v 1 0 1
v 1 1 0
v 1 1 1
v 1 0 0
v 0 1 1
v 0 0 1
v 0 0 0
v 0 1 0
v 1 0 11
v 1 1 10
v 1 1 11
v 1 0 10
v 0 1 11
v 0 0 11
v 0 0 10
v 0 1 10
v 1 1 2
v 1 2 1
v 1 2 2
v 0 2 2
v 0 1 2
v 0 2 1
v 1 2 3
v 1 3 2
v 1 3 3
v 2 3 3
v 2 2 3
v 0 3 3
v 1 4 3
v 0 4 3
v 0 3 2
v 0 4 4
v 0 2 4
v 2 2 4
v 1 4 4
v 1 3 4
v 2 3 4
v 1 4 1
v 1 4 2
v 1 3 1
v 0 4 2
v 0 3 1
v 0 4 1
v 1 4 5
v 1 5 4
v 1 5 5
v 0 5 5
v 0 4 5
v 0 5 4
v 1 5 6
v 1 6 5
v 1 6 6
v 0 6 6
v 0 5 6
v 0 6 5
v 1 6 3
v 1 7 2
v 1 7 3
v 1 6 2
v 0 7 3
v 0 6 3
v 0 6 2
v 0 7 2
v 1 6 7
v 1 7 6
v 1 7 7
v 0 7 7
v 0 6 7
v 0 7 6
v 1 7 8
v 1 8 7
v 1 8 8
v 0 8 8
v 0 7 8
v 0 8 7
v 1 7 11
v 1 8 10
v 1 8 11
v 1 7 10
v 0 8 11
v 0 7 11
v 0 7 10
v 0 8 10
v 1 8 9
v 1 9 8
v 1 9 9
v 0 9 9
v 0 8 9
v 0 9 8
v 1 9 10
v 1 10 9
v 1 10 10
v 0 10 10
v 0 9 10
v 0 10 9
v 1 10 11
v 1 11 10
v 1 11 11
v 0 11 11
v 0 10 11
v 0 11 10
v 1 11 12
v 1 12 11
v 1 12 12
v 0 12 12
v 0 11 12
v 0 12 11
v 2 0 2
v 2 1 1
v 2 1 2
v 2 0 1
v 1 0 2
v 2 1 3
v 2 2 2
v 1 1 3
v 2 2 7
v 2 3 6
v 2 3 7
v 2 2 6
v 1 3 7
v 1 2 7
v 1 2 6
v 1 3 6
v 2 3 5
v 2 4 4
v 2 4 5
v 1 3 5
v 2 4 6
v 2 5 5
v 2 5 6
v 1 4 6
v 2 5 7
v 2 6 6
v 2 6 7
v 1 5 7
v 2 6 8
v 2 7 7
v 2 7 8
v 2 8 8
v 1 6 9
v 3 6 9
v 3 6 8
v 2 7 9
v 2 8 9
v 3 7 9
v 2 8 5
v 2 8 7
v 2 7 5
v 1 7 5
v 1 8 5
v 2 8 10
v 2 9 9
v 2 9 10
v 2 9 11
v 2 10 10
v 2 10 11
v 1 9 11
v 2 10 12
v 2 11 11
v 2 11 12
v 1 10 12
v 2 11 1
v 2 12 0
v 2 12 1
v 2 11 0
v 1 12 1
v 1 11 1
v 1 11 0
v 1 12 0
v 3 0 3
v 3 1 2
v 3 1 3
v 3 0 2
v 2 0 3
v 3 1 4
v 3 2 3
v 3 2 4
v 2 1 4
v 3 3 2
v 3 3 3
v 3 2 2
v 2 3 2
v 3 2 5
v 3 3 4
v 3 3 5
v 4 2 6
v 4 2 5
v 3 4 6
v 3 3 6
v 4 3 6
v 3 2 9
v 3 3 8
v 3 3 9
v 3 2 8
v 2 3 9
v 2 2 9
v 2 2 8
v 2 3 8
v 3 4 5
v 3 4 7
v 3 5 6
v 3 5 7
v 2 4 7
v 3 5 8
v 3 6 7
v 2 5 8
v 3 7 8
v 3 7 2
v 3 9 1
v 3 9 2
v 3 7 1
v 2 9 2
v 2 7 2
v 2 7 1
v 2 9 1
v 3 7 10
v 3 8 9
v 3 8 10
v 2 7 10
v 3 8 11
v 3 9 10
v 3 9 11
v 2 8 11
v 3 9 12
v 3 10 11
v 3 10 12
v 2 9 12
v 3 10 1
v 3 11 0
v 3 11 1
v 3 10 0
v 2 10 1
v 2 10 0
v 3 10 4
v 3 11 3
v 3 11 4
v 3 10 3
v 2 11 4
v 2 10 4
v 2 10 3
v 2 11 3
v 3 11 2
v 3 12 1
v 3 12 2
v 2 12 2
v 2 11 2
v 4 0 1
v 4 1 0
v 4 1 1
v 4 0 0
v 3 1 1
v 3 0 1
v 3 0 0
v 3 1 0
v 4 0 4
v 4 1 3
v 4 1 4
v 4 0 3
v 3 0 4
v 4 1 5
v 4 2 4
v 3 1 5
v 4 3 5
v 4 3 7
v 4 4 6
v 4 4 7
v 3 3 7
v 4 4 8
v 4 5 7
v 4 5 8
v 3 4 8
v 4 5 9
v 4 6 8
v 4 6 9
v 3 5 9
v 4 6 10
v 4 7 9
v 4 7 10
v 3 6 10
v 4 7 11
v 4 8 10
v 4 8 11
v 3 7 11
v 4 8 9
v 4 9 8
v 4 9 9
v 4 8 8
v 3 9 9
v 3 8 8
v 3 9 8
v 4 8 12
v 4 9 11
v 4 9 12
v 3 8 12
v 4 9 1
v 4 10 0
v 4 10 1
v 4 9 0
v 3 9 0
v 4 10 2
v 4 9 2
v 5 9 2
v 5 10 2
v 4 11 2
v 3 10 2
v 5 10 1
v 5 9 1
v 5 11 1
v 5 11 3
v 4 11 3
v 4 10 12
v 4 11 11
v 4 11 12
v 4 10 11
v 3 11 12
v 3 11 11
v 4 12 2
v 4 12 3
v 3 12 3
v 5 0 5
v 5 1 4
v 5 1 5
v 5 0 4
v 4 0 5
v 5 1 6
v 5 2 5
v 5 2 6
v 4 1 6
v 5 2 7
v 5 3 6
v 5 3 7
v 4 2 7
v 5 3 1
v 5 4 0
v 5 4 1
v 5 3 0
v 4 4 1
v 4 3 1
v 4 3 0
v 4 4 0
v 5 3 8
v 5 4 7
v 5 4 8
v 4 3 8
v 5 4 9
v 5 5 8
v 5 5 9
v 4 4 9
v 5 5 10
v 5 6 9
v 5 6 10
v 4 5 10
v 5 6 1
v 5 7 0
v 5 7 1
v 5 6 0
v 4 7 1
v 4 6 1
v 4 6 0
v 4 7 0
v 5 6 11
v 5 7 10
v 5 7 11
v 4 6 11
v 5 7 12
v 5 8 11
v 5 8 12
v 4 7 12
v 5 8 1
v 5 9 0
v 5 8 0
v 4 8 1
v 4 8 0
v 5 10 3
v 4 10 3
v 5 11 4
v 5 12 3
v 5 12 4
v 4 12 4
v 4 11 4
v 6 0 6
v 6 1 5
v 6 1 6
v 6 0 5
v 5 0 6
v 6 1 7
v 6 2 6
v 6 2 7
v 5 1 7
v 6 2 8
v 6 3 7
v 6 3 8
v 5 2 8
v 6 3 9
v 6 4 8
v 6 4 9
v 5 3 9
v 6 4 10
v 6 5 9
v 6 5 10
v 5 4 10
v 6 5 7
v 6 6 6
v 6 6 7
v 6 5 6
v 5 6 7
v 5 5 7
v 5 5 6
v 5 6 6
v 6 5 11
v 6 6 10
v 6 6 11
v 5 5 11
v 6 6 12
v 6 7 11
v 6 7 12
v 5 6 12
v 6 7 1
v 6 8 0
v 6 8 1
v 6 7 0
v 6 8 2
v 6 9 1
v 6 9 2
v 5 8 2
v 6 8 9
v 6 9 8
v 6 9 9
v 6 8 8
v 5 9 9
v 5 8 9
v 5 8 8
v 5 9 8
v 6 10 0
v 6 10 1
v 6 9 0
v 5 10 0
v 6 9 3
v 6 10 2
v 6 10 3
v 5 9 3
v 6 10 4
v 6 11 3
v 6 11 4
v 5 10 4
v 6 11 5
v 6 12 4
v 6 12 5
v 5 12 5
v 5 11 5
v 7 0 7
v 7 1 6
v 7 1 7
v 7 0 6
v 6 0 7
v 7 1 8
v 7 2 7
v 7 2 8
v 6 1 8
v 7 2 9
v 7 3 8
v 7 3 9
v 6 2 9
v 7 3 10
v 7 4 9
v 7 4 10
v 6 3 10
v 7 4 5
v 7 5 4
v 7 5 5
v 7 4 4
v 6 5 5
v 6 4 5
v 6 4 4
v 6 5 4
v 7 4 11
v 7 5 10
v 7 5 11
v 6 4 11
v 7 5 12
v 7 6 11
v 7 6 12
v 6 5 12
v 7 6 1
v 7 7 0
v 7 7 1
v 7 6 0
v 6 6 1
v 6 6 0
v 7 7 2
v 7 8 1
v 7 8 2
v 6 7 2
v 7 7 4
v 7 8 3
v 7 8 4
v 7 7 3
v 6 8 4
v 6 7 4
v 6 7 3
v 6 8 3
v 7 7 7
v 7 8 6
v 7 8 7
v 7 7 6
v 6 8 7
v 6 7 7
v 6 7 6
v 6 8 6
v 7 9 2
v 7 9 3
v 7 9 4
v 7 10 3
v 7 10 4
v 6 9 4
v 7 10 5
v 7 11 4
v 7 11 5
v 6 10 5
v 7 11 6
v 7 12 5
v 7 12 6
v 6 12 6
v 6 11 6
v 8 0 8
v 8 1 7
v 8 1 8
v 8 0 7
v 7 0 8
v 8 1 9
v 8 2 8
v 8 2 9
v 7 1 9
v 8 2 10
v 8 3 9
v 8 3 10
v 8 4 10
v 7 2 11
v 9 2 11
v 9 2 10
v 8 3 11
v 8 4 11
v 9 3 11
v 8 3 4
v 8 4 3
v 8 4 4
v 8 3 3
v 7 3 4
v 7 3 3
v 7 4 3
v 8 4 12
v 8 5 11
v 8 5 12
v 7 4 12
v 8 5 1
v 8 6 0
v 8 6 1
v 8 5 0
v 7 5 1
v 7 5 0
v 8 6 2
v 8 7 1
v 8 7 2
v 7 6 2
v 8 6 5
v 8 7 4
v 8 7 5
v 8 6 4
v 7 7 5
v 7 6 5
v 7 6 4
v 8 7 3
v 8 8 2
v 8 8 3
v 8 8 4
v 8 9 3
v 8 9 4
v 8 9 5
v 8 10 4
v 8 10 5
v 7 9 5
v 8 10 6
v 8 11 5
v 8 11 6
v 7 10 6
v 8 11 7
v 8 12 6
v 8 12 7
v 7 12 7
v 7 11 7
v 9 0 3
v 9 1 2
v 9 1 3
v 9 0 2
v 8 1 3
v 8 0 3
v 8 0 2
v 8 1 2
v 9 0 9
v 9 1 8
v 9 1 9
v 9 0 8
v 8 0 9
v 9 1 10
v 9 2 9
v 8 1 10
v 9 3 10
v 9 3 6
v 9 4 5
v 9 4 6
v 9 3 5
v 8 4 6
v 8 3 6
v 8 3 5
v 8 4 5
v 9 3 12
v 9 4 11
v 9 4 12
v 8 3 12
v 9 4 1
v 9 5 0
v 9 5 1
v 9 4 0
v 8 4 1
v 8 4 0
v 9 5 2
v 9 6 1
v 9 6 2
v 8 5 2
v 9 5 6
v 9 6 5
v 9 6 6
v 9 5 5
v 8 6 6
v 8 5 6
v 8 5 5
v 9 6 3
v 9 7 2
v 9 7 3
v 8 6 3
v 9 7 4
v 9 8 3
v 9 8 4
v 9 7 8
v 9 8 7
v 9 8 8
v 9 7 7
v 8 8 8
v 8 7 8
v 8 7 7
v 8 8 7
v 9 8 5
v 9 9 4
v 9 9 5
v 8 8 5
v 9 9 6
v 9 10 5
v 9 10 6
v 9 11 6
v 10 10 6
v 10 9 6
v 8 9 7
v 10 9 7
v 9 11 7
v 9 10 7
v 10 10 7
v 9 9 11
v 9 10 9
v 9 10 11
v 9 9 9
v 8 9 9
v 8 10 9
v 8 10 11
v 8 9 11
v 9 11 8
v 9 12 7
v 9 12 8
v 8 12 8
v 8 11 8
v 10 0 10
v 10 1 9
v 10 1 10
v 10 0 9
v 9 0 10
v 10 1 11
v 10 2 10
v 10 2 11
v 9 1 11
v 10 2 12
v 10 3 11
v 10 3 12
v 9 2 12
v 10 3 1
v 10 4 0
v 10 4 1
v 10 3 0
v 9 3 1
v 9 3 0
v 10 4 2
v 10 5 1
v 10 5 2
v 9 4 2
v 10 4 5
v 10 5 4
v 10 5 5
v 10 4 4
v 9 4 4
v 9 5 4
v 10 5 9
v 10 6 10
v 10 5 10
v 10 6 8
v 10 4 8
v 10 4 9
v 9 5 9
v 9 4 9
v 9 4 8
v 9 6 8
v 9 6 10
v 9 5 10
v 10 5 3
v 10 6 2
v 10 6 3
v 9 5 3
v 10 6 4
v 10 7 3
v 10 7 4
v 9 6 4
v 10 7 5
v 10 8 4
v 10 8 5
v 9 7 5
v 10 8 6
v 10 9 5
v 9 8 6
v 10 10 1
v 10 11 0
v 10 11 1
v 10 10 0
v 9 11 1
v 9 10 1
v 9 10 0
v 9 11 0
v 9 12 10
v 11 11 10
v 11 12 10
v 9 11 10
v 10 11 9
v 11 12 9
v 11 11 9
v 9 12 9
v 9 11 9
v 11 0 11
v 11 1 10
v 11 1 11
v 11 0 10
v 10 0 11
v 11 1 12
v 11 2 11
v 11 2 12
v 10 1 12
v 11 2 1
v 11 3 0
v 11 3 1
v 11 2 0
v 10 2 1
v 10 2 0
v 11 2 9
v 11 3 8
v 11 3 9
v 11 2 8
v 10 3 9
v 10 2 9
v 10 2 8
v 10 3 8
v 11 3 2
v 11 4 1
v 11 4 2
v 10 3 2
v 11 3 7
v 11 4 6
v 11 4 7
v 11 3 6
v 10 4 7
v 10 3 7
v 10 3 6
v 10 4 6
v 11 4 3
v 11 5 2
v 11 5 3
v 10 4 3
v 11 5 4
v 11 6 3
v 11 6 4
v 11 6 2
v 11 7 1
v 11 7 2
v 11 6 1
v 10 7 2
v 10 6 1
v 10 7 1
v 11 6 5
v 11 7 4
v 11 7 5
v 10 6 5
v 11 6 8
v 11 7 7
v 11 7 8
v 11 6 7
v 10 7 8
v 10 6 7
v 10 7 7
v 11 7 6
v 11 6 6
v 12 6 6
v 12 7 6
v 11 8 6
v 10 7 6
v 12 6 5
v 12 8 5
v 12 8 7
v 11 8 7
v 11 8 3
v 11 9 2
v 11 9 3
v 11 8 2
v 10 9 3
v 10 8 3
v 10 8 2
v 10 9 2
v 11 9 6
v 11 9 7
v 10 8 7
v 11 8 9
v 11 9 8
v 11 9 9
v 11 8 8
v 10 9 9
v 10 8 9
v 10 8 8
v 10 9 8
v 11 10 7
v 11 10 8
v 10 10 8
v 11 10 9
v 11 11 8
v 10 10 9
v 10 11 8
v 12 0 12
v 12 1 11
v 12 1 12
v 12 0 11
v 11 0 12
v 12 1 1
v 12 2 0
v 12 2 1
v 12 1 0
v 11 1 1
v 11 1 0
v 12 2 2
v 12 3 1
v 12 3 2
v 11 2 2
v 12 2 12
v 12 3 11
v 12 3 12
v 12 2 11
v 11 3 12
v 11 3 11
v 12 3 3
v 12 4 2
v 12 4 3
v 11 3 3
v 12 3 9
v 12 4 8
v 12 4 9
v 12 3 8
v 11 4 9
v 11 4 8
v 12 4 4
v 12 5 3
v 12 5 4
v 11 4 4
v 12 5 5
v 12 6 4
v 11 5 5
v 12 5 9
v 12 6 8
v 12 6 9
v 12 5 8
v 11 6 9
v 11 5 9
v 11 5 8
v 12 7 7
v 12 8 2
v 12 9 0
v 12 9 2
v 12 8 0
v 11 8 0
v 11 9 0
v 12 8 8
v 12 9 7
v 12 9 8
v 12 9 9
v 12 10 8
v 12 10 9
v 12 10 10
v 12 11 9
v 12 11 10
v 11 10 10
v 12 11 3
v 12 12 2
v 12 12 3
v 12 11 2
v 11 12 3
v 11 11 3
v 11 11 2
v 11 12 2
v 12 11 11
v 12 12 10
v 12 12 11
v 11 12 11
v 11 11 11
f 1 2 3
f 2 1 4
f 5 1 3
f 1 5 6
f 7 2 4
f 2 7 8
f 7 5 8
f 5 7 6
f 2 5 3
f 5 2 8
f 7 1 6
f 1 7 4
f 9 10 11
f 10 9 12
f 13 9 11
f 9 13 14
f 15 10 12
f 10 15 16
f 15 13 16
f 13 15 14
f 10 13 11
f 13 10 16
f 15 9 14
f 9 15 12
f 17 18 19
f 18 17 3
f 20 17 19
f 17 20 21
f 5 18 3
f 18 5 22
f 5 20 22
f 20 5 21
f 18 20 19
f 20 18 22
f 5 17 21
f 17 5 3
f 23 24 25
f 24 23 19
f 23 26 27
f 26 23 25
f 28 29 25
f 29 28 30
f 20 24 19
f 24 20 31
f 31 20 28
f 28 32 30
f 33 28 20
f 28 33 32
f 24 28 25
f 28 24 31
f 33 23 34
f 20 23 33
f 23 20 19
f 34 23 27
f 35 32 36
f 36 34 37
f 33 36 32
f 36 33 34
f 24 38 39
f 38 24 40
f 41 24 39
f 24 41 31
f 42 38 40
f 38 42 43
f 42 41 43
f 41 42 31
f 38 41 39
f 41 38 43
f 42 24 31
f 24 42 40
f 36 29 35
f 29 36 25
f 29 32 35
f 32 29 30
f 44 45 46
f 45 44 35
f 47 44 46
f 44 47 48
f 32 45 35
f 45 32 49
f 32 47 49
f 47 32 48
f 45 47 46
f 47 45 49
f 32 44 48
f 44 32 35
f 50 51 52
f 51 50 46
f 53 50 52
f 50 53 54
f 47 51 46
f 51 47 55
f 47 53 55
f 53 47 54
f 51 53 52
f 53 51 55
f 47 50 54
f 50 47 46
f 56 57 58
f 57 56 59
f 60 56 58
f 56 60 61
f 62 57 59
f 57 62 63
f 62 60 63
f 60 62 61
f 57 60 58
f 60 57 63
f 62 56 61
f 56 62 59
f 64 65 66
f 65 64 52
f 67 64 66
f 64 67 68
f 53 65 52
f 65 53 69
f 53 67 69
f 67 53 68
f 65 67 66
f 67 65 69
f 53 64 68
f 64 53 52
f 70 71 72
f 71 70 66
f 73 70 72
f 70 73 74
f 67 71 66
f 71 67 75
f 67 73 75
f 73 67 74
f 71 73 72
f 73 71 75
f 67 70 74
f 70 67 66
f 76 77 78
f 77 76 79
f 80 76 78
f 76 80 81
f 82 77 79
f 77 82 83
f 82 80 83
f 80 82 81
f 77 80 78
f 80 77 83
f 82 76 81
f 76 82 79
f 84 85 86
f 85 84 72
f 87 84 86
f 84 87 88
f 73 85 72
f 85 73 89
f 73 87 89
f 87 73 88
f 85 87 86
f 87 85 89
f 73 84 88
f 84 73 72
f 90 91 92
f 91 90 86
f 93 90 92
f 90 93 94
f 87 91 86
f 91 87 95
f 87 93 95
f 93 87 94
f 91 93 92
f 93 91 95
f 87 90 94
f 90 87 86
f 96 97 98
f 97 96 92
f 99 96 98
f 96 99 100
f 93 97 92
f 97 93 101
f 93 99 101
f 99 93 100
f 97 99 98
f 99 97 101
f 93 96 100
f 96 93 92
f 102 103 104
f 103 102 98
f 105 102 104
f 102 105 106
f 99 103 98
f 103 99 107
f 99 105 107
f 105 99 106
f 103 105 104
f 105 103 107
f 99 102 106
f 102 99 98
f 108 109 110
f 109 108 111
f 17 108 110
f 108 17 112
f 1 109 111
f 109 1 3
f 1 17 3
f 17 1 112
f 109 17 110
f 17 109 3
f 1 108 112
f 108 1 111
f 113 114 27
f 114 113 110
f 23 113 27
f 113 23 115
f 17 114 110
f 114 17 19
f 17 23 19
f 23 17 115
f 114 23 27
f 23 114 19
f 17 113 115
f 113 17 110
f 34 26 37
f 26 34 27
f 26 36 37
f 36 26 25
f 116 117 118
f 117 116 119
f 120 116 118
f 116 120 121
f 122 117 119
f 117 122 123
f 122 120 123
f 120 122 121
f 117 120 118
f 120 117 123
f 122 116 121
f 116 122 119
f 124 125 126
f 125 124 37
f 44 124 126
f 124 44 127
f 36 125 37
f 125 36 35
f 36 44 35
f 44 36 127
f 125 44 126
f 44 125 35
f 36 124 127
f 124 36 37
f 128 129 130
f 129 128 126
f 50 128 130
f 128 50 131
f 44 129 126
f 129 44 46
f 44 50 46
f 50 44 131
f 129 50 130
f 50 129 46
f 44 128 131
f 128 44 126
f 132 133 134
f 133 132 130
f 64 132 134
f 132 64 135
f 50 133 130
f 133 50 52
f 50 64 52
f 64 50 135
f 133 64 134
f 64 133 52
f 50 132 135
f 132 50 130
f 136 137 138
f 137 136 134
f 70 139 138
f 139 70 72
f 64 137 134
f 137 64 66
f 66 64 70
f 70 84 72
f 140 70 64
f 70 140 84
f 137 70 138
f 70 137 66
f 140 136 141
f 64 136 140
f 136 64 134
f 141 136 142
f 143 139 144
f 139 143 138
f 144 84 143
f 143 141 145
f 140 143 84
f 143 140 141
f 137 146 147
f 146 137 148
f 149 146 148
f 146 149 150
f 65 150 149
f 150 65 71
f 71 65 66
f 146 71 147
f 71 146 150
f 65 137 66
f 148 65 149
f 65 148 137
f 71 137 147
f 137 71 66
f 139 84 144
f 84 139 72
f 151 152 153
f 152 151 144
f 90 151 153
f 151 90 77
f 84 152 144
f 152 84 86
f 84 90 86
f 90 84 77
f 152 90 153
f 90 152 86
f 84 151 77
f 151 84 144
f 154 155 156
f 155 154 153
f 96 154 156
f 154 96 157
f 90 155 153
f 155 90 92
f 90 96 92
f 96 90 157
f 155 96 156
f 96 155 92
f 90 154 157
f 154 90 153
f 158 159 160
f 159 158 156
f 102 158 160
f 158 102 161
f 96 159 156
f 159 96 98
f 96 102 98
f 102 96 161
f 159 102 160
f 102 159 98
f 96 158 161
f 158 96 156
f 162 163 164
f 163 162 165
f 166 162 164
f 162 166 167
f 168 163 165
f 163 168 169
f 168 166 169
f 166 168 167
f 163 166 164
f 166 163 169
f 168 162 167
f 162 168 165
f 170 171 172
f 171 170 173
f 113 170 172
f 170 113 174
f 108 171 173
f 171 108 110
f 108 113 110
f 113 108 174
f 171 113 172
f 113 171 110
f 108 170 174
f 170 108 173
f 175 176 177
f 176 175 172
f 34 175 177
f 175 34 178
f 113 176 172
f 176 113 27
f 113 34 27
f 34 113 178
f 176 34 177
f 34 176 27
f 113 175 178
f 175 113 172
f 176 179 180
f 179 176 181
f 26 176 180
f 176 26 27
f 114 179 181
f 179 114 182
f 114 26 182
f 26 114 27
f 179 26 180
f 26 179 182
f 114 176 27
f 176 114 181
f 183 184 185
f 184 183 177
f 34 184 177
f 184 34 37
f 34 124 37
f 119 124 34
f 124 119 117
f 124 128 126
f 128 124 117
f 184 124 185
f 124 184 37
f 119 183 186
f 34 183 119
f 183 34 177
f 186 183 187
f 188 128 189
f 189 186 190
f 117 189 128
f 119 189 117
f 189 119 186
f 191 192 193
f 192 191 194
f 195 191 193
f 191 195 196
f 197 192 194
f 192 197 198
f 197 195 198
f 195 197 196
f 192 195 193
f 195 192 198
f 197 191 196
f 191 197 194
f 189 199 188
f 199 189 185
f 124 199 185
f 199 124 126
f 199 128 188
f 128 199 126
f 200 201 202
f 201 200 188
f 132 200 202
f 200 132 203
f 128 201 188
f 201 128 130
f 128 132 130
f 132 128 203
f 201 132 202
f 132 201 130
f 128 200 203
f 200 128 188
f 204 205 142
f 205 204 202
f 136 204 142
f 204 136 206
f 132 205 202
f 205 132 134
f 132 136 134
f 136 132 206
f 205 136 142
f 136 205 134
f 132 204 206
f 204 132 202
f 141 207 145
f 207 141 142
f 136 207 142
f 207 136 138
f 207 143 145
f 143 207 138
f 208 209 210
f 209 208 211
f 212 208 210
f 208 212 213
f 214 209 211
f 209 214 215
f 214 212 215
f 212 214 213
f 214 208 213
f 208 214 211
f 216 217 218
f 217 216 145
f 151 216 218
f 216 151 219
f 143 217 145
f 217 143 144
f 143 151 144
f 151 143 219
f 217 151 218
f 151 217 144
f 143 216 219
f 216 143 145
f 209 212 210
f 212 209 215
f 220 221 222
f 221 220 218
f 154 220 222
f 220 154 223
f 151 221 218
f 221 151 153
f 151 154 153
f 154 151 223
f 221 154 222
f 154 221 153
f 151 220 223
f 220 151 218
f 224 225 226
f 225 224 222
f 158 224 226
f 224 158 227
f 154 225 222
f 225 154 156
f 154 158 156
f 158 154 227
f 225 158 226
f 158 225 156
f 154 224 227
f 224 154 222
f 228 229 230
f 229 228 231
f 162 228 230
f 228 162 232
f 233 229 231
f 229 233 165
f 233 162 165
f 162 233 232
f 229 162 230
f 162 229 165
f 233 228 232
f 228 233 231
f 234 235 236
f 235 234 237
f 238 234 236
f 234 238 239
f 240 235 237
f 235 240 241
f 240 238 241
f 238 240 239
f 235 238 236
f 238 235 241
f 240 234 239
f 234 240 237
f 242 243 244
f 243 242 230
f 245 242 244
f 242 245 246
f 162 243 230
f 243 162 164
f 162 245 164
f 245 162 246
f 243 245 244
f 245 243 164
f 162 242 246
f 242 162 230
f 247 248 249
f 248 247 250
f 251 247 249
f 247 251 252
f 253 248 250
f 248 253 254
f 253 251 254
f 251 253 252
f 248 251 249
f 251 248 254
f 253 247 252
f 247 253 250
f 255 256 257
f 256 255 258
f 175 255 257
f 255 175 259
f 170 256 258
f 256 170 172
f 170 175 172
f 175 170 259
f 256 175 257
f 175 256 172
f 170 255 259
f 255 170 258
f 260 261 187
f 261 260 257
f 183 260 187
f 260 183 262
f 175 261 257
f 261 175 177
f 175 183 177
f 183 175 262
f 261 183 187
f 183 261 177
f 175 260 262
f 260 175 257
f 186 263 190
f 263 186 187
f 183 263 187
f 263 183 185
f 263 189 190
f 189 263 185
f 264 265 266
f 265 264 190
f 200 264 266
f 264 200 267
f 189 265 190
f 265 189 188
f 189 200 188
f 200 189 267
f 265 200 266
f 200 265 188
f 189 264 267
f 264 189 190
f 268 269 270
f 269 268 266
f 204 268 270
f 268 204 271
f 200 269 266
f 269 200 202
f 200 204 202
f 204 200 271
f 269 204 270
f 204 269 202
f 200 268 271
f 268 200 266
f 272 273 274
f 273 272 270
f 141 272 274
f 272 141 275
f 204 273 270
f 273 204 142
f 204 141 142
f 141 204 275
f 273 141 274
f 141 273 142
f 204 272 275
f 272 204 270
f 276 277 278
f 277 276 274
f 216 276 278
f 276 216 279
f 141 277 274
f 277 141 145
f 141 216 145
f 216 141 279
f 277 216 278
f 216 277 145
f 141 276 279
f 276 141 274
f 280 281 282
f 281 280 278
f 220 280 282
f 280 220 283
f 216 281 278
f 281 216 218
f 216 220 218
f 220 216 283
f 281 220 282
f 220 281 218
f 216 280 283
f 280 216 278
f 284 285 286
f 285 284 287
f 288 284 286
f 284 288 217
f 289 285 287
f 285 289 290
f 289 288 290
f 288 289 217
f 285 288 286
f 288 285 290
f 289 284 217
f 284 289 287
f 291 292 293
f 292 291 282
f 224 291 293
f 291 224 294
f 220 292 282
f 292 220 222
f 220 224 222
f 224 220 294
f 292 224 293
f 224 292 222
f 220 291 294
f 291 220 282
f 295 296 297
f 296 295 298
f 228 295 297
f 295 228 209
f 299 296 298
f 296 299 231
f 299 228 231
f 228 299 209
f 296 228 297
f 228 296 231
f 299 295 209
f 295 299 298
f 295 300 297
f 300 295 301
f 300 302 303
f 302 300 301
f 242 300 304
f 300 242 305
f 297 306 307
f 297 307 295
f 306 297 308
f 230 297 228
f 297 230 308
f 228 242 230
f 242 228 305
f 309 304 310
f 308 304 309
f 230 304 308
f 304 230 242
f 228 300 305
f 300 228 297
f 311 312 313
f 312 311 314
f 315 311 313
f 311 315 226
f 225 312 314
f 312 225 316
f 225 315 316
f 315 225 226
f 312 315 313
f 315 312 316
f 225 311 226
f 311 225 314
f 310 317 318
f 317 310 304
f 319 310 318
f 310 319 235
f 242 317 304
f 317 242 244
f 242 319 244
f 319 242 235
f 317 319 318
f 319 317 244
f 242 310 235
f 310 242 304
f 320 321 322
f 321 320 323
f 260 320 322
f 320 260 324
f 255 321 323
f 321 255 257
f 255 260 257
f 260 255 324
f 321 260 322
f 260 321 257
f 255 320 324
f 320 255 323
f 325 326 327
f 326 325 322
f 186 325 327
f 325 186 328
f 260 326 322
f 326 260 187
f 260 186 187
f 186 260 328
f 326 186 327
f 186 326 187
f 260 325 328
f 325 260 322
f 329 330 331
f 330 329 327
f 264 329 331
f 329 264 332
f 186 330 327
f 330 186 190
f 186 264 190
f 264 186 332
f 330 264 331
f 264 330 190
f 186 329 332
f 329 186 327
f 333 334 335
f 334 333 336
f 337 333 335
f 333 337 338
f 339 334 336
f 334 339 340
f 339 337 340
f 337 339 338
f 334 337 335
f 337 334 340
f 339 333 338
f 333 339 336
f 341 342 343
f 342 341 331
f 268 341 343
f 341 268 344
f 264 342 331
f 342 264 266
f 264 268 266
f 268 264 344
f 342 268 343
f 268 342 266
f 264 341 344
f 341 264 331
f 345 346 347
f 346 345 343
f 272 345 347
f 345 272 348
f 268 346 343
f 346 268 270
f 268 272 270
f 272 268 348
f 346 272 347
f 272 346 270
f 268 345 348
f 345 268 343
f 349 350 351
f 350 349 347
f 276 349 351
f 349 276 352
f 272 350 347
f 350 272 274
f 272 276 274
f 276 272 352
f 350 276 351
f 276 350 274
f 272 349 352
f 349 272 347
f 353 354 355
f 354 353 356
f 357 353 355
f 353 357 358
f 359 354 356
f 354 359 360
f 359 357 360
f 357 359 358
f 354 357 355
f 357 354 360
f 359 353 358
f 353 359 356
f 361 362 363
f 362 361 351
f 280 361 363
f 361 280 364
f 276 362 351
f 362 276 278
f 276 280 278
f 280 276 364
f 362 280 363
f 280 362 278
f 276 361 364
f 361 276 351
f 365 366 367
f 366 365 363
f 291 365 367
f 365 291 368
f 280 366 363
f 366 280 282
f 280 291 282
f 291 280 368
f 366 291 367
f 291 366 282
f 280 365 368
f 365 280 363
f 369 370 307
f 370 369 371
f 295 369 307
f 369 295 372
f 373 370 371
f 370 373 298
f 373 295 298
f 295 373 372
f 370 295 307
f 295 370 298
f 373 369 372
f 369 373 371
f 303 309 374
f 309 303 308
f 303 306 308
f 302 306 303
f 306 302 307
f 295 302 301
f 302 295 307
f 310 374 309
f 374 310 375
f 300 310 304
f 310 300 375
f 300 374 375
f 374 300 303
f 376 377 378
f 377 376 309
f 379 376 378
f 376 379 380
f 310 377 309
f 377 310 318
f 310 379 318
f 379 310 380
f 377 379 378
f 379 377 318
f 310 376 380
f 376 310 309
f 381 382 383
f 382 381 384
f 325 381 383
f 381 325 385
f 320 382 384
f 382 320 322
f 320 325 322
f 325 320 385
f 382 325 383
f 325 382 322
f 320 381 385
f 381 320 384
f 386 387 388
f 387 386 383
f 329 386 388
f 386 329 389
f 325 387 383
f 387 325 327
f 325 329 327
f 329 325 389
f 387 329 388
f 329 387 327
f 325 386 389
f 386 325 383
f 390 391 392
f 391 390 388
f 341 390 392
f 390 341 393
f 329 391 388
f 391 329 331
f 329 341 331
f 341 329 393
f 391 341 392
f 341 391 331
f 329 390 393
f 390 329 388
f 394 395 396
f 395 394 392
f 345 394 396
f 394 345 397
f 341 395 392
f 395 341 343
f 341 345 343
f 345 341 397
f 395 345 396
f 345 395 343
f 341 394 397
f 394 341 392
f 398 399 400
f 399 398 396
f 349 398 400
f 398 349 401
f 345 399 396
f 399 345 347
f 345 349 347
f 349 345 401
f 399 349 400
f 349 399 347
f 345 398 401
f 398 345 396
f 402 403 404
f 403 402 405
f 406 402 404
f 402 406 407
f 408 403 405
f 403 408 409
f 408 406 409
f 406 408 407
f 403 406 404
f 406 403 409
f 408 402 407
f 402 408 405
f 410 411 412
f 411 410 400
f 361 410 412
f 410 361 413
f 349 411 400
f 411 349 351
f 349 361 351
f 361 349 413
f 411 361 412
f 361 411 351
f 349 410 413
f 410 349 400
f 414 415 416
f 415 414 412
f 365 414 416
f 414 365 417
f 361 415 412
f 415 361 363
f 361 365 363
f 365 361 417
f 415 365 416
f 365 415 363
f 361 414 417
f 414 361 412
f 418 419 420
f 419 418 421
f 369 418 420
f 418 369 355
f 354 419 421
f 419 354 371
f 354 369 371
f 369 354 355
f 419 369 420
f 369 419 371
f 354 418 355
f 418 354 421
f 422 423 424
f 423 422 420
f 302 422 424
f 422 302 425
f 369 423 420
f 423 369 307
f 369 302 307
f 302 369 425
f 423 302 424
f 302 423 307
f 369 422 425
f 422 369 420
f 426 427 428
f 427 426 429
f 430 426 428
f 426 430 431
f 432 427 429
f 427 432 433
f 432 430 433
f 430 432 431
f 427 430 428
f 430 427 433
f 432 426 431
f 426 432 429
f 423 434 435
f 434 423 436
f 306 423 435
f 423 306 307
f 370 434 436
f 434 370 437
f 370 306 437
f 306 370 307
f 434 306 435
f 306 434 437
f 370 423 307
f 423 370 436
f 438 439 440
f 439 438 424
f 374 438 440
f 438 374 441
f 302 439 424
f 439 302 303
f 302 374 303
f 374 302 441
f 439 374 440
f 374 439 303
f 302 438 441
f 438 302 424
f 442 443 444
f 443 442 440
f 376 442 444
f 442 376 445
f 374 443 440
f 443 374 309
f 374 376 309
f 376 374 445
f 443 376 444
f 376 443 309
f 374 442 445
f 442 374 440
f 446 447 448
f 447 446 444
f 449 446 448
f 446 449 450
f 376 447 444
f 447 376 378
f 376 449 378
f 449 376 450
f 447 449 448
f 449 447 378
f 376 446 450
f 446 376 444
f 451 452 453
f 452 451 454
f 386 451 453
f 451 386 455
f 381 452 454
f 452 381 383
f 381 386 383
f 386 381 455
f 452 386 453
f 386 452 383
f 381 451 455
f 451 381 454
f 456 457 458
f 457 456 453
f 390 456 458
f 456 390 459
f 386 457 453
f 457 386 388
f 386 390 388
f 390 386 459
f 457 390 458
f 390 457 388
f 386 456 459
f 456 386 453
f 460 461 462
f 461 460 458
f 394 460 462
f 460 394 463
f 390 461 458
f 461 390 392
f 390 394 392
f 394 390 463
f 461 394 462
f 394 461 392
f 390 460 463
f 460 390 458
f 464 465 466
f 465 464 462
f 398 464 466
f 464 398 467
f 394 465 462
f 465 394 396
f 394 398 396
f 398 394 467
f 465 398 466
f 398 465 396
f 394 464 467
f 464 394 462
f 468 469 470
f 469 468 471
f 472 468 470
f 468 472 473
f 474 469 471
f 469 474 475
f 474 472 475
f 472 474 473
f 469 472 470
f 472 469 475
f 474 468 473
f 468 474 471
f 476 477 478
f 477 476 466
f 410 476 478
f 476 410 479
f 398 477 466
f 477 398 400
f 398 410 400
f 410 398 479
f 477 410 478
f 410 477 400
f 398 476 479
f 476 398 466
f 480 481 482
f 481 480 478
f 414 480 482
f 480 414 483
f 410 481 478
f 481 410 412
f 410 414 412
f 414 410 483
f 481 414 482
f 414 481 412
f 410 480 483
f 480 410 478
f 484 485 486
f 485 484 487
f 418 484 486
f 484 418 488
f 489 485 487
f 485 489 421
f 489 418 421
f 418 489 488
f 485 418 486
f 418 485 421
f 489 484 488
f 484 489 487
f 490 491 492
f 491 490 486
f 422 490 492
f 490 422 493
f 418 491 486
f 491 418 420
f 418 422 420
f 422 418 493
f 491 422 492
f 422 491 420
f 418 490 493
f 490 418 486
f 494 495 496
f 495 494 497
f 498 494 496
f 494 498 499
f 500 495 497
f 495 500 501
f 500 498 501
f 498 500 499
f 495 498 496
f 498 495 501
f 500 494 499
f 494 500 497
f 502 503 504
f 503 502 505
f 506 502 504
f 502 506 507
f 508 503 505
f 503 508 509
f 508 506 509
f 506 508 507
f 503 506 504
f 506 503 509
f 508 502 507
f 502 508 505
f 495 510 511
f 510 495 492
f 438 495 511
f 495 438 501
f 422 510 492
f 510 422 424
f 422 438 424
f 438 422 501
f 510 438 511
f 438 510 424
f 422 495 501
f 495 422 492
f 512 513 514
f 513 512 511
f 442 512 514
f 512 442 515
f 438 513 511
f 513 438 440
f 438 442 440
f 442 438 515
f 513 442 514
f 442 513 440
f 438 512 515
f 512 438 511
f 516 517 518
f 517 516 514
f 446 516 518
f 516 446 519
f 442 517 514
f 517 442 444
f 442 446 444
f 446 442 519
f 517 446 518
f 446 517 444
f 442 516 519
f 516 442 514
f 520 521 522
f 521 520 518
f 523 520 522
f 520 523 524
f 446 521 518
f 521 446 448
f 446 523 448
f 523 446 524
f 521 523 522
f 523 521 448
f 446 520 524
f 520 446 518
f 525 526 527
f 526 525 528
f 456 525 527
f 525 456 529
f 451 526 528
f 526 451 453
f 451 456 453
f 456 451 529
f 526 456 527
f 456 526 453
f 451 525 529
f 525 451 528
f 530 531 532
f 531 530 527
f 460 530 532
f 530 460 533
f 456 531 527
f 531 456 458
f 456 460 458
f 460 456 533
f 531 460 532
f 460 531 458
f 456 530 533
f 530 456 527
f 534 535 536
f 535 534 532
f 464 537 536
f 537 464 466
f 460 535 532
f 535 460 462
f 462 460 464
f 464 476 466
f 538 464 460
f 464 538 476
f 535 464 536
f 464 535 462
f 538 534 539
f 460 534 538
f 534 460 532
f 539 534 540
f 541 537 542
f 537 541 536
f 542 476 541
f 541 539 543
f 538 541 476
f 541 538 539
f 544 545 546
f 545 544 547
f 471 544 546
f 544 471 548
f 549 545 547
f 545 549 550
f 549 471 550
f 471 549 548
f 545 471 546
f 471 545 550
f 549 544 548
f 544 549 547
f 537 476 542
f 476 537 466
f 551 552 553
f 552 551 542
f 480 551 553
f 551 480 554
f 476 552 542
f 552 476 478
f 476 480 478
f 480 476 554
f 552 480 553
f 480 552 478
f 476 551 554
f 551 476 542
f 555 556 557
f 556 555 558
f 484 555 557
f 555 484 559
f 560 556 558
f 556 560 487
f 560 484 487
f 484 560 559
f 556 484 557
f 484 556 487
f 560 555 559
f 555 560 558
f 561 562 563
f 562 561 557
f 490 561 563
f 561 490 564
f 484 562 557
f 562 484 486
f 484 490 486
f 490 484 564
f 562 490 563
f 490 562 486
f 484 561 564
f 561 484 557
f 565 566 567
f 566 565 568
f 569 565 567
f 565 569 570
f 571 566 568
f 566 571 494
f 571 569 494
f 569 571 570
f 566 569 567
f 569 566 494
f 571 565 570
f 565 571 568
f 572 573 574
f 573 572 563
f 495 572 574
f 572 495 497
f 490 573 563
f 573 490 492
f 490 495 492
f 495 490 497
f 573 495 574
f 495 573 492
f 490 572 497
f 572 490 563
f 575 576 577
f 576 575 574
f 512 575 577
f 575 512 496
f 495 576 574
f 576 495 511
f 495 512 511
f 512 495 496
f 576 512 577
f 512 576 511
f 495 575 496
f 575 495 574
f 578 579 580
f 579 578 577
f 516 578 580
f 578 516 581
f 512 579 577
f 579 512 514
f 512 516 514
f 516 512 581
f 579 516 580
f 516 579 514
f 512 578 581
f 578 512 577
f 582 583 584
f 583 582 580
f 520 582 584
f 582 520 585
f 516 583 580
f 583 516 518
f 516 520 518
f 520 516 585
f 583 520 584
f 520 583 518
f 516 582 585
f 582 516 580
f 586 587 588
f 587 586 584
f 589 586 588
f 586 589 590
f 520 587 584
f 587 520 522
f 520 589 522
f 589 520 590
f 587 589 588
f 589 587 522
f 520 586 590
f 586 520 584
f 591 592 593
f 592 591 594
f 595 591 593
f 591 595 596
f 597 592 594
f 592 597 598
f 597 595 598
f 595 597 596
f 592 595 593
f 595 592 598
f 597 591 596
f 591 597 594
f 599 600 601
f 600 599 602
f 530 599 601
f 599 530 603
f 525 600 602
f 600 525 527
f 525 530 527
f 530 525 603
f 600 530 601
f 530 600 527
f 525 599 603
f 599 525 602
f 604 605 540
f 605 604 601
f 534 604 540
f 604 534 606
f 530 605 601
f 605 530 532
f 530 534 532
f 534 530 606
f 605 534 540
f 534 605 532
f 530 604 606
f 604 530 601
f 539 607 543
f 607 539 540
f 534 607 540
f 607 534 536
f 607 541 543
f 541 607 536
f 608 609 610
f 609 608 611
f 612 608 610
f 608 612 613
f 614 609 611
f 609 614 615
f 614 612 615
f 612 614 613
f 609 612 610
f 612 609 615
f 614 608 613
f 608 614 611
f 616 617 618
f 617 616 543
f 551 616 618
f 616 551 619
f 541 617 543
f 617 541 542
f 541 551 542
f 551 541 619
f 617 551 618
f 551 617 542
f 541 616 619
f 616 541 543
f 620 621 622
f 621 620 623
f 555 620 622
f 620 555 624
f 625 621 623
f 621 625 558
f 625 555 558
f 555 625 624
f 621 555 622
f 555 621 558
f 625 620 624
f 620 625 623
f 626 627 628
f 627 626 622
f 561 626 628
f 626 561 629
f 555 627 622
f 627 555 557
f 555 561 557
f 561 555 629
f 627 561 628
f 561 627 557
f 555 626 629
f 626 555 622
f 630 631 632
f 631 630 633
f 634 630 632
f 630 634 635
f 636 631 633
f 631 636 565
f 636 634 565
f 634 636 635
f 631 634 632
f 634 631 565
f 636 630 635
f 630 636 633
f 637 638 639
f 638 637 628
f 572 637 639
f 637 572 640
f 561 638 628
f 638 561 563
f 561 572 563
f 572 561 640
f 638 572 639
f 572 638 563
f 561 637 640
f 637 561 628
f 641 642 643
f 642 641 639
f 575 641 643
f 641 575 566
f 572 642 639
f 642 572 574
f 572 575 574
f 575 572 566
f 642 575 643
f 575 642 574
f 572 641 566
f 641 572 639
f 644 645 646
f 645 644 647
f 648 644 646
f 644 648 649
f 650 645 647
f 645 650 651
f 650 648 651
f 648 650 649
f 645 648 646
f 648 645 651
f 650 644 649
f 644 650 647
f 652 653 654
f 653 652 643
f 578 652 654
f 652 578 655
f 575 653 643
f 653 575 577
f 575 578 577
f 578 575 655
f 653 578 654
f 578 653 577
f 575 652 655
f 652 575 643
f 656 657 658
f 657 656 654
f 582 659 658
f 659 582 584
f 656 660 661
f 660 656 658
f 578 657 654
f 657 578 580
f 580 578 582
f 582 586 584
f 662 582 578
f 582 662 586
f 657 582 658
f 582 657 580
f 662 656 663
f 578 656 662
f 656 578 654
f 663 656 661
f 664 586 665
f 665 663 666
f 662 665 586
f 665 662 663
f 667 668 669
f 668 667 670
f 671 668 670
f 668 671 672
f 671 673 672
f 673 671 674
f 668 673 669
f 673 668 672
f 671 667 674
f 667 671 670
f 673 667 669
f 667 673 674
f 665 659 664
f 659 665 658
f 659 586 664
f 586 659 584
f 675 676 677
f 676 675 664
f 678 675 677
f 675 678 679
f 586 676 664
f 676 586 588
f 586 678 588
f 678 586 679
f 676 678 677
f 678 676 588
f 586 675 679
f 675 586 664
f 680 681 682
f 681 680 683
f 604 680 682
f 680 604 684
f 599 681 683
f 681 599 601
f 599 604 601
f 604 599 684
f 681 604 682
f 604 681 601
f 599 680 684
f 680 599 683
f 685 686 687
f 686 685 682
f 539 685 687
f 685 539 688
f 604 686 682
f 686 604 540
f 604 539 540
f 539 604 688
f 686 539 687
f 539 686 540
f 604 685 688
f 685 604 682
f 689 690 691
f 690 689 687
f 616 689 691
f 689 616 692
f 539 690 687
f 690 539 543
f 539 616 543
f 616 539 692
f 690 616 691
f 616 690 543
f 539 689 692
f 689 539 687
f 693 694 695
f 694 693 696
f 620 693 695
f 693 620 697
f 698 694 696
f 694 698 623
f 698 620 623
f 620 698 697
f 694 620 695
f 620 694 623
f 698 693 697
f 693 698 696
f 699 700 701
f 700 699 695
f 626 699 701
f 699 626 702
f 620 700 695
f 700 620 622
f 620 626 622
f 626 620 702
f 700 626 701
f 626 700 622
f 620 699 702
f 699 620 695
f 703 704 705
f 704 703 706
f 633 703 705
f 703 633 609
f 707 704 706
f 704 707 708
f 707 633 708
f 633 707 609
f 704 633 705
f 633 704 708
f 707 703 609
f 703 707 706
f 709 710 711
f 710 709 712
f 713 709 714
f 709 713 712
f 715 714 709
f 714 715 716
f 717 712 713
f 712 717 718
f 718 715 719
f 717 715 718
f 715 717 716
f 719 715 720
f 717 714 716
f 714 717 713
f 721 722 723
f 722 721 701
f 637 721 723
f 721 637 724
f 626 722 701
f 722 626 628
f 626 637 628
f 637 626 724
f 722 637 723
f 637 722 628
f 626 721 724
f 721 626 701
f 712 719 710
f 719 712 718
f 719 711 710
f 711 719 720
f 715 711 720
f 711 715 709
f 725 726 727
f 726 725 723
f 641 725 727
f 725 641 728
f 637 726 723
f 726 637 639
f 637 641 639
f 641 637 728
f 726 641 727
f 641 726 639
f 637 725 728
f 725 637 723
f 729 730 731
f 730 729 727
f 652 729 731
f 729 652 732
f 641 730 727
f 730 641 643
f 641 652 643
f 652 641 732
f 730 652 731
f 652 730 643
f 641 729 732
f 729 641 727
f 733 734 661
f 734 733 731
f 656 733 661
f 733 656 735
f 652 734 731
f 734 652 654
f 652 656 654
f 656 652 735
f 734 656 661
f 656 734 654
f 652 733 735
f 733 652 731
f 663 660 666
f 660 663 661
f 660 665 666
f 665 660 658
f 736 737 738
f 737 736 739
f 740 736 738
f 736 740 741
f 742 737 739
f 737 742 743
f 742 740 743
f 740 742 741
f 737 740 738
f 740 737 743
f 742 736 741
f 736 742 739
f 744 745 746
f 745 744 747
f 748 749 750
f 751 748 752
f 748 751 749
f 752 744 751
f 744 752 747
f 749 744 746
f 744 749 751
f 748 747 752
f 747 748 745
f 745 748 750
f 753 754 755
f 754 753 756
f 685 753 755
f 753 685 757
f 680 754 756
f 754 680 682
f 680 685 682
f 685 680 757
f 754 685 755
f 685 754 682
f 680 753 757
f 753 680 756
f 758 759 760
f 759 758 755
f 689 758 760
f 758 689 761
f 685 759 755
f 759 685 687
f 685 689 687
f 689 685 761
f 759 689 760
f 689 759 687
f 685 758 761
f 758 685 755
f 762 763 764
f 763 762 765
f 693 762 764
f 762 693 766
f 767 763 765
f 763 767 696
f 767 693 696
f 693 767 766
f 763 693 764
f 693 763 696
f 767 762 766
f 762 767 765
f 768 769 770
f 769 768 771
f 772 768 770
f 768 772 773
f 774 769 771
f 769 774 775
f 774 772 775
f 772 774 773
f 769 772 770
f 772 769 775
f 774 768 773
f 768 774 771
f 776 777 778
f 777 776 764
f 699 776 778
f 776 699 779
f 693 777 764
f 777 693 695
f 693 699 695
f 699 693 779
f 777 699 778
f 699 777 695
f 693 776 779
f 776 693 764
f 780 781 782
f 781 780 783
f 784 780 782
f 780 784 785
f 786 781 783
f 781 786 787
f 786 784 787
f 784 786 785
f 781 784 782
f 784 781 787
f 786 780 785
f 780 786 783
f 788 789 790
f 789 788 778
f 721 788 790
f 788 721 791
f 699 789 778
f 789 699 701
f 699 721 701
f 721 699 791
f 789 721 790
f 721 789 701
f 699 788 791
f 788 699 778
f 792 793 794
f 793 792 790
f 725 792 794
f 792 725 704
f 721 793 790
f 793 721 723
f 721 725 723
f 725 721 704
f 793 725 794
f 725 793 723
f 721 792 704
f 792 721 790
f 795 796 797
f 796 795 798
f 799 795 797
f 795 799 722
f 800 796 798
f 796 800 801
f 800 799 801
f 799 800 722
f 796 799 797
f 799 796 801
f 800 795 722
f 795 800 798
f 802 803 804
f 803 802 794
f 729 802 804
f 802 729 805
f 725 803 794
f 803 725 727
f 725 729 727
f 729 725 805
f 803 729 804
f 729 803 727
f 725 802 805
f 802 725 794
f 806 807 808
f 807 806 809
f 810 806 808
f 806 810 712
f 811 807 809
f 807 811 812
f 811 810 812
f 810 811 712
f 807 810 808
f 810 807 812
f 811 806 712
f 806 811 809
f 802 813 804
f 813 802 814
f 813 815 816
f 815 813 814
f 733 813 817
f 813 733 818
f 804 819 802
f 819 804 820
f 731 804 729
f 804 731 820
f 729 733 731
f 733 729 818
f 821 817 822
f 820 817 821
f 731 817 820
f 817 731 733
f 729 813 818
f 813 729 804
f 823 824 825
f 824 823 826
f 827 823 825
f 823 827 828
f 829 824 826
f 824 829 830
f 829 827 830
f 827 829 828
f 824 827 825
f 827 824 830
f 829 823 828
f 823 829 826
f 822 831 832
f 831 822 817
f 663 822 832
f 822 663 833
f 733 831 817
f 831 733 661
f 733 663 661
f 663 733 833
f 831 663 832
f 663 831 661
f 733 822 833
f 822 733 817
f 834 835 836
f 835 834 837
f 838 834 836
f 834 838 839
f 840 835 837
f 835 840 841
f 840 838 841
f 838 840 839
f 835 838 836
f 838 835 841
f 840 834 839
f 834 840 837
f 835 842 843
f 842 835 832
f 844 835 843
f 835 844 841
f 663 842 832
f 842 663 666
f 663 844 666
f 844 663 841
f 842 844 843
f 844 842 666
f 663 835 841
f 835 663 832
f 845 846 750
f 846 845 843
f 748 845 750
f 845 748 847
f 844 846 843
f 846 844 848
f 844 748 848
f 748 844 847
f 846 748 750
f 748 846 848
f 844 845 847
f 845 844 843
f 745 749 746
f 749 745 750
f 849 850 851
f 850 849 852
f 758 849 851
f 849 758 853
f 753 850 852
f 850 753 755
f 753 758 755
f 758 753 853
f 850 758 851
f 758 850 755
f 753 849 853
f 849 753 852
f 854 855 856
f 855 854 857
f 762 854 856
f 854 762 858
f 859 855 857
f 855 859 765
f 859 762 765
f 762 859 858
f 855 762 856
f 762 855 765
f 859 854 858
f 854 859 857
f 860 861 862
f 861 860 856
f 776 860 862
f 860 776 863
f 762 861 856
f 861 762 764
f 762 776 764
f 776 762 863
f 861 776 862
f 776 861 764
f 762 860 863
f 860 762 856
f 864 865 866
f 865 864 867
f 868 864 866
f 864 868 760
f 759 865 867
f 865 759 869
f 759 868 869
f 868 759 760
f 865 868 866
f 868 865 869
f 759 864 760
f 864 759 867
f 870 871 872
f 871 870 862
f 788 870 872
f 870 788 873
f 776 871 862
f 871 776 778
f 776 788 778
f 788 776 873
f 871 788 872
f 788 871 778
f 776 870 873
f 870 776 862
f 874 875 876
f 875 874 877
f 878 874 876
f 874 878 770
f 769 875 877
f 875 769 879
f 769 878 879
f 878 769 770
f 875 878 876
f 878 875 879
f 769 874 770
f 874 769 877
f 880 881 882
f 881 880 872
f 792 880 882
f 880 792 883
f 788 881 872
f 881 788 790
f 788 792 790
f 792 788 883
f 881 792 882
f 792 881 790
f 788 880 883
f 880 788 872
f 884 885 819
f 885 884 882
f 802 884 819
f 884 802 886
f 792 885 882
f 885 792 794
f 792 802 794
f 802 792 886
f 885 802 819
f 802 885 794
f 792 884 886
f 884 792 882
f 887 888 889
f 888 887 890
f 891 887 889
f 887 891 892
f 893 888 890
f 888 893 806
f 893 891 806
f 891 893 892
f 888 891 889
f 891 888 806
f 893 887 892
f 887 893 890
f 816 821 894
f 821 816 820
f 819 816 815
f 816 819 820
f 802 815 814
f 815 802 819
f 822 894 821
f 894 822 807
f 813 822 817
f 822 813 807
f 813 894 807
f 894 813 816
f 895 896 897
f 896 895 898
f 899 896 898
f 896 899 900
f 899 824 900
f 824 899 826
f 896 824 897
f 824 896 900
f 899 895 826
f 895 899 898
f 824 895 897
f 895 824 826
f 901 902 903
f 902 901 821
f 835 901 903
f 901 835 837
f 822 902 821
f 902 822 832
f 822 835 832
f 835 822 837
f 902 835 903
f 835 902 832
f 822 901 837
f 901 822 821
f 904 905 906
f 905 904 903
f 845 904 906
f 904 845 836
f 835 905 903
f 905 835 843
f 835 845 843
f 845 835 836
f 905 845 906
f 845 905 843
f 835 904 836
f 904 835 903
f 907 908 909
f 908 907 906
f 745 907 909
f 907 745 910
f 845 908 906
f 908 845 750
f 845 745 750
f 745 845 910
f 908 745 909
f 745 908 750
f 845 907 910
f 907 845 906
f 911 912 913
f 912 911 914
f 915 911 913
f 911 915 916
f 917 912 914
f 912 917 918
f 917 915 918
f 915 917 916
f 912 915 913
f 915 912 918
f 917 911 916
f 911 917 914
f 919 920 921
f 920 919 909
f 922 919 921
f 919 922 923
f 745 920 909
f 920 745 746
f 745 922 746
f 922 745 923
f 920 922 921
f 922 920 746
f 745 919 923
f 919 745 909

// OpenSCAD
union() {
    translate([0, 0, 0]) cube([1, 1, 1]);
    translate([0, 0, 10]) cube([1, 1, 1]);
    translate([0, 1, 1]) cube([1, 1, 1]);
    translate([0, 2, 2]) cube([1, 1, 1]);
    translate([0, 2, 3]) cube([1, 1, 1]);
    translate([0, 3, 1]) cube([1, 1, 1]);
    translate([0, 3, 3]) cube([1, 1, 1]);
    translate([0, 4, 4]) cube([1, 1, 1]);
    translate([0, 5, 5]) cube([1, 1, 1]);
    translate([0, 6, 2]) cube([1, 1, 1]);
    translate([0, 6, 6]) cube([1, 1, 1]);
    translate([0, 7, 7]) cube([1, 1, 1]);
    translate([0, 7, 10]) cube([1, 1, 1]);
    translate([0, 8, 8]) cube([1, 1, 1]);
    translate([0, 9, 9]) cube([1, 1, 1]);
    translate([0, 10, 10]) cube([1, 1, 1]);
    translate([0, 11, 11]) cube([1, 1, 1]);
    translate([1, 0, 1]) cube([1, 1, 1]);
    translate([1, 1, 2]) cube([1, 1, 1]);
    translate([1, 2, 3]) cube([1, 1, 1]);
    translate([1, 2, 6]) cube([1, 1, 1]);
    translate([1, 3, 4]) cube([1, 1, 1]);
    translate([1, 4, 5]) cube([1, 1, 1]);
    translate([1, 5, 6]) cube([1, 1, 1]);
    translate([1, 6, 7]) cube([1, 1, 1]);
    translate([1, 6, 8]) cube([1, 1, 1]);
    translate([1, 7, 5]) cube([1, 1, 1]);
    translate([1, 7, 6]) cube([1, 1, 1]);
    translate([1, 7, 8]) cube([1, 1, 1]);
    translate([1, 8, 9]) cube([1, 1, 1]);
    translate([1, 9, 10]) cube([1, 1, 1]);
    translate([1, 10, 11]) cube([1, 1, 1]);
    translate([1, 11, 0]) cube([1, 1, 1]);
    translate([2, 0, 2]) cube([1, 1, 1]);
    translate([2, 1, 3]) cube([1, 1, 1]);
    translate([2, 2, 2]) cube([1, 1, 1]);
    translate([2, 2, 4]) cube([1, 1, 1]);
    translate([2, 2, 5]) cube([1, 1, 1]);
    translate([2, 2, 8]) cube([1, 1, 1]);
    translate([2, 3, 5]) cube([1, 1, 1]);
    translate([2, 4, 6]) cube([1, 1, 1]);
    translate([2, 5, 7]) cube([1, 1, 1]);
    translate([2, 6, 8]) cube([1, 1, 1]);
    translate([2, 7, 1]) cube([1, 1, 1]);
    translate([2, 7, 9]) cube([1, 1, 1]);
    translate([2, 8, 1]) cube([1, 1, 1]);
    translate([2, 8, 10]) cube([1, 1, 1]);
    translate([2, 9, 11]) cube([1, 1, 1]);
    translate([2, 10, 0]) cube([1, 1, 1]);
    translate([2, 10, 3]) cube([1, 1, 1]);
    translate([2, 11, 1]) cube([1, 1, 1]);
    translate([3, 0, 0]) cube([1, 1, 1]);
    translate([3, 0, 3]) cube([1, 1, 1]);
    translate([3, 1, 4]) cube([1, 1, 1]);
    translate([3, 2, 5]) cube([1, 1, 1]);
    translate([3, 3, 6]) cube([1, 1, 1]);
    translate([3, 4, 7]) cube([1, 1, 1]);
    translate([3, 5, 8]) cube([1, 1, 1]);
    translate([3, 6, 9]) cube([1, 1, 1]);
    translate([3, 7, 10]) cube([1, 1, 1]);
    translate([3, 8, 8]) cube([1, 1, 1]);
    translate([3, 8, 11]) cube([1, 1, 1]);
    translate([3, 9, 0]) cube([1, 1, 1]);
    translate([3, 10, 1]) cube([1, 1, 1]);
    translate([3, 10, 11]) cube([1, 1, 1]);
    translate([3, 11, 2]) cube([1, 1, 1]);
    translate([4, 0, 4]) cube([1, 1, 1]);
    translate([4, 1, 5]) cube([1, 1, 1]);
    translate([4, 2, 6]) cube([1, 1, 1]);
    translate([4, 3, 0]) cube([1, 1, 1]);
    translate([4, 3, 7]) cube([1, 1, 1]);
    translate([4, 4, 8]) cube([1, 1, 1]);
    translate([4, 5, 9]) cube([1, 1, 1]);
    translate([4, 6, 0]) cube([1, 1, 1]);
    translate([4, 6, 10]) cube([1, 1, 1]);
    translate([4, 7, 11]) cube([1, 1, 1]);
    translate([4, 8, 0]) cube([1, 1, 1]);
    translate([4, 9, 1]) cube([1, 1, 1]);
    translate([4, 10, 1]) cube([1, 1, 1]);
    translate([4, 10, 2]) cube([1, 1, 1]);
    translate([4, 11, 3]) cube([1, 1, 1]);
    translate([5, 0, 5]) cube([1, 1, 1]);
    translate([5, 1, 6]) cube([1, 1, 1]);
    translate([5, 2, 7]) cube([1, 1, 1]);
    translate([5, 3, 8]) cube([1, 1, 1]);
    translate([5, 4, 9]) cube([1, 1, 1]);
    translate([5, 5, 6]) cube([1, 1, 1]);
    translate([5, 5, 10]) cube([1, 1, 1]);
    translate([5, 6, 11]) cube([1, 1, 1]);
    translate([5, 7, 0]) cube([1, 1, 1]);
    translate([5, 8, 1]) cube([1, 1, 1]);
    translate([5, 8, 8]) cube([1, 1, 1]);
    translate([5, 9, 0]) cube([1, 1, 1]);
    translate([5, 9, 2]) cube([1, 1, 1]);
    translate([5, 10, 3]) cube([1, 1, 1]);
    translate([5, 11, 4]) cube([1, 1, 1]);
    translate([6, 0, 6]) cube([1, 1, 1]);
    translate([6, 1, 7]) cube([1, 1, 1]);
    translate([6, 2, 8]) cube([1, 1, 1]);
    translate([6, 3, 9]) cube([1, 1, 1]);
    translate([6, 4, 4]) cube([1, 1, 1]);
    translate([6, 4, 10]) cube([1, 1, 1]);
    translate([6, 5, 11]) cube([1, 1, 1]);
    translate([6, 6, 0]) cube([1, 1, 1]);
    translate([6, 7, 1]) cube([1, 1, 1]);
    translate([6, 7, 3]) cube([1, 1, 1]);
    translate([6, 7, 6]) cube([1, 1, 1]);
    translate([6, 8, 2]) cube([1, 1, 1]);
    translate([6, 9, 3]) cube([1, 1, 1]);
    translate([6, 10, 4]) cube([1, 1, 1]);
    translate([6, 11, 5]) cube([1, 1, 1]);
    translate([7, 0, 7]) cube([1, 1, 1]);
    translate([7, 1, 8]) cube([1, 1, 1]);
    translate([7, 2, 9]) cube([1, 1, 1]);
    translate([7, 2, 10]) cube([1, 1, 1]);
    translate([7, 3, 3]) cube([1, 1, 1]);
    translate([7, 3, 10]) cube([1, 1, 1]);
    translate([7, 4, 11]) cube([1, 1, 1]);
    translate([7, 5, 0]) cube([1, 1, 1]);
    translate([7, 6, 1]) cube([1, 1, 1]);
    translate([7, 6, 4]) cube([1, 1, 1]);
    translate([7, 7, 2]) cube([1, 1, 1]);
    translate([7, 8, 3]) cube([1, 1, 1]);
    translate([7, 9, 4]) cube([1, 1, 1]);
    translate([7, 10, 5]) cube([1, 1, 1]);
    translate([7, 11, 6]) cube([1, 1, 1]);
    translate([8, 0, 2]) cube([1, 1, 1]);
    translate([8, 0, 8]) cube([1, 1, 1]);
    translate([8, 1, 9]) cube([1, 1, 1]);
    translate([8, 2, 10]) cube([1, 1, 1]);
    translate([8, 3, 5]) cube([1, 1, 1]);
    translate([8, 3, 11]) cube([1, 1, 1]);
    translate([8, 4, 0]) cube([1, 1, 1]);
    translate([8, 5, 1]) cube([1, 1, 1]);
    translate([8, 5, 5]) cube([1, 1, 1]);
    translate([8, 6, 2]) cube([1, 1, 1]);
    translate([8, 7, 3]) cube([1, 1, 1]);
    translate([8, 7, 7]) cube([1, 1, 1]);
    translate([8, 8, 4]) cube([1, 1, 1]);
    translate([8, 9, 5]) cube([1, 1, 1]);
    translate([8, 9, 6]) cube([1, 1, 1]);
    translate([8, 9, 9]) cube([1, 1, 1]);
    translate([8, 9, 10]) cube([1, 1, 1]);
    translate([8, 10, 6]) cube([1, 1, 1]);
    translate([8, 11, 7]) cube([1, 1, 1]);
    translate([9, 0, 9]) cube([1, 1, 1]);
    translate([9, 1, 10]) cube([1, 1, 1]);
    translate([9, 2, 11]) cube([1, 1, 1]);
    translate([9, 3, 0]) cube([1, 1, 1]);
    translate([9, 4, 1]) cube([1, 1, 1]);
    translate([9, 4, 4]) cube([1, 1, 1]);
    translate([9, 4, 8]) cube([1, 1, 1]);
    translate([9, 5, 2]) cube([1, 1, 1]);
    translate([9, 5, 8]) cube([1, 1, 1]);
    translate([9, 5, 9]) cube([1, 1, 1]);
    translate([9, 6, 3]) cube([1, 1, 1]);
    translate([9, 7, 4]) cube([1, 1, 1]);
    translate([9, 8, 5]) cube([1, 1, 1]);
    translate([9, 9, 6]) cube([1, 1, 1]);
    translate([9, 10, 0]) cube([1, 1, 1]);
    translate([9, 11, 9]) cube([1, 1, 1]);
    translate([10, 0, 10]) cube([1, 1, 1]);
    translate([10, 1, 11]) cube([1, 1, 1]);
    translate([10, 2, 0]) cube([1, 1, 1]);
    translate([10, 2, 8]) cube([1, 1, 1]);
    translate([10, 3, 1]) cube([1, 1, 1]);
    translate([10, 3, 6]) cube([1, 1, 1]);
    translate([10, 4, 2]) cube([1, 1, 1]);
    translate([10, 5, 3]) cube([1, 1, 1]);
    translate([10, 6, 1]) cube([1, 1, 1]);
    translate([10, 6, 4]) cube([1, 1, 1]);
    translate([10, 6, 7]) cube([1, 1, 1]);
    translate([10, 7, 5]) cube([1, 1, 1]);
    translate([10, 8, 2]) cube([1, 1, 1]);
    translate([10, 8, 6]) cube([1, 1, 1]);
    translate([10, 8, 8]) cube([1, 1, 1]);
    translate([10, 9, 7]) cube([1, 1, 1]);
    translate([10, 10, 8]) cube([1, 1, 1]);
    translate([10, 11, 9]) cube([1, 1, 1]);
    translate([11, 0, 11]) cube([1, 1, 1]);
    translate([11, 1, 0]) cube([1, 1, 1]);
    translate([11, 2, 1]) cube([1, 1, 1]);
    translate([11, 2, 11]) cube([1, 1, 1]);
    translate([11, 3, 2]) cube([1, 1, 1]);
    translate([11, 3, 8]) cube([1, 1, 1]);
    translate([11, 4, 3]) cube([1, 1, 1]);
    translate([11, 5, 4]) cube([1, 1, 1]);
    translate([11, 5, 8]) cube([1, 1, 1]);
    translate([11, 6, 5]) cube([1, 1, 1]);
    translate([11, 7, 5]) cube([1, 1, 1]);
    translate([11, 7, 6]) cube([1, 1, 1]);
    translate([11, 8, 0]) cube([1, 1, 1]);
    translate([11, 8, 1]) cube([1, 1, 1]);
    translate([11, 8, 7]) cube([1, 1, 1]);
    translate([11, 9, 8]) cube([1, 1, 1]);
    translate([11, 10, 9]) cube([1, 1, 1]);
    translate([11, 11, 2]) cube([1, 1, 1]);
    translate([11, 11, 10]) cube([1, 1, 1]);
}
